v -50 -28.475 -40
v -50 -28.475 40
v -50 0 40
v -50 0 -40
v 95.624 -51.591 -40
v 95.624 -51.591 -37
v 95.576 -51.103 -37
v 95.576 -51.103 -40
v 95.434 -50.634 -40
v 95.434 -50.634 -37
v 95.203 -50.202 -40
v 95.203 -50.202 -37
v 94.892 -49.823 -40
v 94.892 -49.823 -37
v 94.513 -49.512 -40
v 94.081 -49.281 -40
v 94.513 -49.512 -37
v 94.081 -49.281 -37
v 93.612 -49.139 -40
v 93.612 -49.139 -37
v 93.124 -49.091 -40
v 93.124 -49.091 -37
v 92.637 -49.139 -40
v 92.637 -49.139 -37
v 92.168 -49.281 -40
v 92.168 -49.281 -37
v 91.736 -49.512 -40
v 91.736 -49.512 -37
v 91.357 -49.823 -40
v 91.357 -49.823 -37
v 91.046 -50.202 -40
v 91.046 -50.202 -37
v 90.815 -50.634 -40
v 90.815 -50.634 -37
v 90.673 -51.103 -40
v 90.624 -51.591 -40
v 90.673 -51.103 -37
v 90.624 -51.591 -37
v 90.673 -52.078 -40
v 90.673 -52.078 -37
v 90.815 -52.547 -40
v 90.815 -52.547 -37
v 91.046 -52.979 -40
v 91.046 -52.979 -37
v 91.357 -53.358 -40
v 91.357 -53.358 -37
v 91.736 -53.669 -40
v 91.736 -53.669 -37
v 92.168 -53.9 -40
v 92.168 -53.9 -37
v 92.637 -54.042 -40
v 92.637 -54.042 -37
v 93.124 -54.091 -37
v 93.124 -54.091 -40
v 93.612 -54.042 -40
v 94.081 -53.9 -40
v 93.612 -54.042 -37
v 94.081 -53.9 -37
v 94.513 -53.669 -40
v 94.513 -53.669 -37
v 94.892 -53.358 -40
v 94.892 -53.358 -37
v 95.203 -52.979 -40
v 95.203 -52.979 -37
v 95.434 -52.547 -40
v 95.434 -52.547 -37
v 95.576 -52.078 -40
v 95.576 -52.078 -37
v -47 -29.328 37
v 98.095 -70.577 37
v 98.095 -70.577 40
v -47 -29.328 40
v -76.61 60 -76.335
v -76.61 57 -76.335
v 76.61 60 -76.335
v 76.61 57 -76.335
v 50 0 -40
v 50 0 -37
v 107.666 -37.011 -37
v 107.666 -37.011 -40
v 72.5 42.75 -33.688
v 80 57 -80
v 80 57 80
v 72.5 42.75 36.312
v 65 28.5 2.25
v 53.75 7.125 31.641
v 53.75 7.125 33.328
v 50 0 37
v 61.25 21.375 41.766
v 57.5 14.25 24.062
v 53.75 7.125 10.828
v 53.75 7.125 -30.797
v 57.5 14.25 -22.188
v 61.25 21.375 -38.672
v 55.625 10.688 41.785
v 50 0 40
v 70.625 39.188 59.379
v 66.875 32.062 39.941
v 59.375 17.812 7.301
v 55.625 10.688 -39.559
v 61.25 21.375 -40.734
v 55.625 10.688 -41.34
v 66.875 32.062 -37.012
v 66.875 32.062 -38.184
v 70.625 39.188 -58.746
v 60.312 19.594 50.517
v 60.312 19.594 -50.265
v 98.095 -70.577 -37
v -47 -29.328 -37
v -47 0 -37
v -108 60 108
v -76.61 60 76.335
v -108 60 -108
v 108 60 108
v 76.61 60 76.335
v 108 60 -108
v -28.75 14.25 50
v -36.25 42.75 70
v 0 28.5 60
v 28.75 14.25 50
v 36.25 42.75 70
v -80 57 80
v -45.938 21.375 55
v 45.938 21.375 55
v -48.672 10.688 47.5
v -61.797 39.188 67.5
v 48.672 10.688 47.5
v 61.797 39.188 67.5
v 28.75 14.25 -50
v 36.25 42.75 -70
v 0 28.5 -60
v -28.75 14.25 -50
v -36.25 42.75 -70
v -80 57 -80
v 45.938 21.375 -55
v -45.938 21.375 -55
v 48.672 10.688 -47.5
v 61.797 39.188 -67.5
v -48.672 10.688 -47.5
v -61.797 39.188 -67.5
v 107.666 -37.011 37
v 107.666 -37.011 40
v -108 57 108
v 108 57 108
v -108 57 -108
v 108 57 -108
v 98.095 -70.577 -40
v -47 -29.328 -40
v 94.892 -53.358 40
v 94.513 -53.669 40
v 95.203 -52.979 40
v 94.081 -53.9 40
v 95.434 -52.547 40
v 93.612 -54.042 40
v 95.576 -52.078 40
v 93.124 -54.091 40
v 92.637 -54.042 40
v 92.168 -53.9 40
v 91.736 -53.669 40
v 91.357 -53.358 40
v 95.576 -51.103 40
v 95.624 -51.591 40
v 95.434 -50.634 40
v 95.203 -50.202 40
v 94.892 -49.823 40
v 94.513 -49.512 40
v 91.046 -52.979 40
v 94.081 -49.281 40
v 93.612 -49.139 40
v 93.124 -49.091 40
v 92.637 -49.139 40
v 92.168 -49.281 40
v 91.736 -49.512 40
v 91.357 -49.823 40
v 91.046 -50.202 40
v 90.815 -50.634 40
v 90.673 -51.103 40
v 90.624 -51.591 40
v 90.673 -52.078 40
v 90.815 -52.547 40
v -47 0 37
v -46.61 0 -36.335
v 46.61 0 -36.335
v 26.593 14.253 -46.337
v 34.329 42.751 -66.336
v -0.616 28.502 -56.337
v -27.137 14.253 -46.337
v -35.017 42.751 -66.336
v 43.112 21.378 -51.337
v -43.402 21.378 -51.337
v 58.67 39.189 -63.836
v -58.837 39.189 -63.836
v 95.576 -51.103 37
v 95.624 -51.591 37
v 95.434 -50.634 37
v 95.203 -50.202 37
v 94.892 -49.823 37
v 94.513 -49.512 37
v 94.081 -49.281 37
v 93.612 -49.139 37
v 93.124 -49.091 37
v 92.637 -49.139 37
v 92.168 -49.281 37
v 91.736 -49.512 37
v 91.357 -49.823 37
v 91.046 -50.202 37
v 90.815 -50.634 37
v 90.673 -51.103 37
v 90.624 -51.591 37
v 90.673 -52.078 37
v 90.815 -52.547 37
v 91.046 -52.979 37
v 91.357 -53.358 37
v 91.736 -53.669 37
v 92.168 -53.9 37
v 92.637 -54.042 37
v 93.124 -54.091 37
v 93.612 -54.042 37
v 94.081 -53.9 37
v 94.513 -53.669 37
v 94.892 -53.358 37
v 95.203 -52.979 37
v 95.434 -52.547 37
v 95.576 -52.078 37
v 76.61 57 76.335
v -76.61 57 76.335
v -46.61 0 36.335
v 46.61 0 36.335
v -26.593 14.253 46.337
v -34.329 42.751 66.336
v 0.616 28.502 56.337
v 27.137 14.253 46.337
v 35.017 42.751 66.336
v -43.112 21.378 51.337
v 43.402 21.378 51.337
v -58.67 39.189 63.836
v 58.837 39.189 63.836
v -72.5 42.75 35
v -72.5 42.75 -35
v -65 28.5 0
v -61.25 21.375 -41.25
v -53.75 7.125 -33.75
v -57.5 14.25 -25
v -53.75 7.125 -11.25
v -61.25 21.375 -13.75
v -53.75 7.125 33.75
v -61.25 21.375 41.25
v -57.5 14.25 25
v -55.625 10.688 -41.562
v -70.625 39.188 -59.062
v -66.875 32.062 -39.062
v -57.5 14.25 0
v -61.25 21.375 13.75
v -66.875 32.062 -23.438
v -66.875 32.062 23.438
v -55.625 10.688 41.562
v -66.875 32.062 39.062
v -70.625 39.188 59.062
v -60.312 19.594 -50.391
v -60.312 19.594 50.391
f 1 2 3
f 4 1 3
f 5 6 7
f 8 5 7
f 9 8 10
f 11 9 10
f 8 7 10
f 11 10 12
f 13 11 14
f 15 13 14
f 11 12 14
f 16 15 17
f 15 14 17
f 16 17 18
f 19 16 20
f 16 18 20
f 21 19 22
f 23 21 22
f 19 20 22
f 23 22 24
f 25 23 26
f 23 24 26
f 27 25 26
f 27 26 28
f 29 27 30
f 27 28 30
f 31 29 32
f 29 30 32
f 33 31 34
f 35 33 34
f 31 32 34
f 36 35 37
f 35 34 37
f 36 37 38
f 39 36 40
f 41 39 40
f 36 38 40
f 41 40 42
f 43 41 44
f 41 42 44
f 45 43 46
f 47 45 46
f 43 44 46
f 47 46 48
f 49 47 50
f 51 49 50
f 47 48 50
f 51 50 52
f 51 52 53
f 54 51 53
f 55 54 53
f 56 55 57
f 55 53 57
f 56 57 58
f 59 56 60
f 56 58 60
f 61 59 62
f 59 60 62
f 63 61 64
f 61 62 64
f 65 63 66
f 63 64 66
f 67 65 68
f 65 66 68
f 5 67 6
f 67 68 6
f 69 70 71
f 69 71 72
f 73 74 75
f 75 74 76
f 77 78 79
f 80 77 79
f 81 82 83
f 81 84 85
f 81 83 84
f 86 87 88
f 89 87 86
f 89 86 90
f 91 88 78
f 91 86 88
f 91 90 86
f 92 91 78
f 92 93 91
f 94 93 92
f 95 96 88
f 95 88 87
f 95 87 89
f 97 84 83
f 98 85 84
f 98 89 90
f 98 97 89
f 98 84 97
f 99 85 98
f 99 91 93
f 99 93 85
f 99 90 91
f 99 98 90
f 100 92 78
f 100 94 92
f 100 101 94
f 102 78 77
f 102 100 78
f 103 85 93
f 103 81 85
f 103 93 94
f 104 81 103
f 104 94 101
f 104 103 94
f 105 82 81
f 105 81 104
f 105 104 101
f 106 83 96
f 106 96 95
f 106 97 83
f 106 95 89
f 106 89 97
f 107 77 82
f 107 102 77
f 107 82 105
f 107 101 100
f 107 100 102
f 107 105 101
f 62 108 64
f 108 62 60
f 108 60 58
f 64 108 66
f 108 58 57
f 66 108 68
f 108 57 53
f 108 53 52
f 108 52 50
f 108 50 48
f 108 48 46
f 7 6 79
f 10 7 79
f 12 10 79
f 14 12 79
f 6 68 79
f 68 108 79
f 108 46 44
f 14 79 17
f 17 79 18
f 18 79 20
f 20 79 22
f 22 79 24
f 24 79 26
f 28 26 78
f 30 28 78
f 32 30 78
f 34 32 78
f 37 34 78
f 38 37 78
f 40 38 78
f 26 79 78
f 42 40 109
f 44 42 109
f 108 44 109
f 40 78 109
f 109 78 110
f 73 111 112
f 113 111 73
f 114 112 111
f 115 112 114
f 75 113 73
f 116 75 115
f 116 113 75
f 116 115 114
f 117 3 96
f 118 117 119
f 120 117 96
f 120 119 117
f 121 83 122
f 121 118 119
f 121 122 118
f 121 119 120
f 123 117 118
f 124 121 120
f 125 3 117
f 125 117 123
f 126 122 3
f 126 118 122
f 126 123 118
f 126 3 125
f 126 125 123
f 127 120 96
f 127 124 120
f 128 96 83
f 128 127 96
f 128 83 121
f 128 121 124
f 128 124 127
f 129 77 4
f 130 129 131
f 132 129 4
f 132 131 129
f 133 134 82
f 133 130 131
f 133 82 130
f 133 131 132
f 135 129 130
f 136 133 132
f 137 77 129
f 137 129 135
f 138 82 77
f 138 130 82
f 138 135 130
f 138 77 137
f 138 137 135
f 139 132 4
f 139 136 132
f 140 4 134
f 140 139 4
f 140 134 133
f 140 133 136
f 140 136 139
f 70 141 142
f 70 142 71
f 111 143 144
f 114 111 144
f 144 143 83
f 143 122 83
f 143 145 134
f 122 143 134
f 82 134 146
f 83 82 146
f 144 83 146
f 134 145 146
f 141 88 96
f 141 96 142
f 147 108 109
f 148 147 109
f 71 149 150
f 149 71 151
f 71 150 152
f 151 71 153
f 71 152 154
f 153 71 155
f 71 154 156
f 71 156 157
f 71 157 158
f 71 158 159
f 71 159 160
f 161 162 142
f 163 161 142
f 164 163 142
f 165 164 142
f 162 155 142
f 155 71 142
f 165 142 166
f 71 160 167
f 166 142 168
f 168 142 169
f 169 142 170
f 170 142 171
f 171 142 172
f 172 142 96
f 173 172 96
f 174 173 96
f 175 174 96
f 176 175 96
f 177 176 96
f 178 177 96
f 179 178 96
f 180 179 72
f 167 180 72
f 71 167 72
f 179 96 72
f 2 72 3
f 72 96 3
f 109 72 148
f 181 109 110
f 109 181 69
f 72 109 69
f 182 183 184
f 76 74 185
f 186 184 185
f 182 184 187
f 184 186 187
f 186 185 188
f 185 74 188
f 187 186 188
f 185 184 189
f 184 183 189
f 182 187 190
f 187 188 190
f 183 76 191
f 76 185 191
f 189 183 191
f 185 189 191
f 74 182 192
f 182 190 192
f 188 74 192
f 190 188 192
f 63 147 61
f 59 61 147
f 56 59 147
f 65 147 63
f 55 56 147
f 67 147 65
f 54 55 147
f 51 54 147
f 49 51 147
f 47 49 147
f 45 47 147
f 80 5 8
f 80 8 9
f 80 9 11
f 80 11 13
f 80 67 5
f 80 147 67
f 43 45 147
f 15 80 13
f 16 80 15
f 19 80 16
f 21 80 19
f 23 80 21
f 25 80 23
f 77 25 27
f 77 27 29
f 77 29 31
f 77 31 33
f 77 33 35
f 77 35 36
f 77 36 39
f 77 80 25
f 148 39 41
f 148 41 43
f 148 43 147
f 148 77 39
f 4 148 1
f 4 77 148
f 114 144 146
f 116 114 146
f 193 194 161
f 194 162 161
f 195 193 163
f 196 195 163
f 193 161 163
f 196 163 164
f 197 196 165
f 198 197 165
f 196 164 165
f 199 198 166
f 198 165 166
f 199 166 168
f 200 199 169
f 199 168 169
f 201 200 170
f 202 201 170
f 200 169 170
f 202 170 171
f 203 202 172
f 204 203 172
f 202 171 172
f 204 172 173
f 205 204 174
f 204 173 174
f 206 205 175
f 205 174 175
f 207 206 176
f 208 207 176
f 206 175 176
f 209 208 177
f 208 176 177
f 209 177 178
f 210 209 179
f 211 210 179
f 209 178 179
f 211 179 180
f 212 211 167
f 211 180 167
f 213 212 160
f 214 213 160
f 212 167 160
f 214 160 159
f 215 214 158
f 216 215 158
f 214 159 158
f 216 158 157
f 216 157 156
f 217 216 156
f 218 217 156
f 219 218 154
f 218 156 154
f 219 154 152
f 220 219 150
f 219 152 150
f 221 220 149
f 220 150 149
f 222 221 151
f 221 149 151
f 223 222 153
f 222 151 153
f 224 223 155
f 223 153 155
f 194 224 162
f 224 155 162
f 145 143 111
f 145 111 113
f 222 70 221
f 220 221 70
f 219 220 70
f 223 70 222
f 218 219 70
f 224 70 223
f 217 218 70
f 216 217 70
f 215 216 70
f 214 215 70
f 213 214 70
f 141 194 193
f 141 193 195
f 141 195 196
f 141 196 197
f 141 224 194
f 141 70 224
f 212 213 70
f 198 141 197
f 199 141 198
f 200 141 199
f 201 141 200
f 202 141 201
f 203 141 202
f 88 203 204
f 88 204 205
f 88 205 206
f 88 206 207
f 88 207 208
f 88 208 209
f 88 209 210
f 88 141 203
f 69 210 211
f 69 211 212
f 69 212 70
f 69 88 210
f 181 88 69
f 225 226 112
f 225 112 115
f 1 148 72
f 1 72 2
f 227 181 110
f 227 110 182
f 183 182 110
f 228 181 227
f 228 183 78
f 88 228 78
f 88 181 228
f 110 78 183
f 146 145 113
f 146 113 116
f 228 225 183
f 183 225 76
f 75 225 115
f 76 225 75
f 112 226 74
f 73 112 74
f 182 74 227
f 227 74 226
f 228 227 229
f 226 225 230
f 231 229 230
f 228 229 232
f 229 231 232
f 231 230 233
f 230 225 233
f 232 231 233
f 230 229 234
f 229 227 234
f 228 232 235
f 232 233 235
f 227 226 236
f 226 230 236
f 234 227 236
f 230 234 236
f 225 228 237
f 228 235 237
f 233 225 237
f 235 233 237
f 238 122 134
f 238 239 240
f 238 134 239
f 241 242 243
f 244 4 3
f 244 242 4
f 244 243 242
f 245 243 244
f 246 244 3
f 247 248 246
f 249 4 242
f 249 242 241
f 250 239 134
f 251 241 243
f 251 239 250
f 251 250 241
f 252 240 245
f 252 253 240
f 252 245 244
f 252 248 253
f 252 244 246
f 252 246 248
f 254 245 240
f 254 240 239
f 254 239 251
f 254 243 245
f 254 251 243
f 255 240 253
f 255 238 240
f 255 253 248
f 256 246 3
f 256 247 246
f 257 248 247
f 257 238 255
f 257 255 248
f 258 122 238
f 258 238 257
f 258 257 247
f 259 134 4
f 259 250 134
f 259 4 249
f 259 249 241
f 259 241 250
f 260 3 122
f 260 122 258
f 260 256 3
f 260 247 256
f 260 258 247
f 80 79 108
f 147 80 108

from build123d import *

# Parameters (mm, degrees)
WALL_THICKNESS_T         = -3
FLANGE_PROFILE_W         = 216
FLANGE_PROFILE_H         = 216
FLANGE_PROFILE_W_2       = 153.219712456
FLANGE_PROFILE_H_2       = 152.670025112
MOUNTING_FLANGE_DEPTH    = 3
OUTLET_START             = 37
OUTLET_SIDE_FRONT_DEPTH  = 3
OUTLET_START_2           = -37
OUTLET_SIDE_REAR_DEPTH   = 3
OUTLET_BACK_DEPTH        = 40
SKETCH_6_R               = 2.5
JOINT_FIXING_HOLES_DEPTH = 40


with BuildPart() as part:
    # 草图1 → Hopper Shape section 0
    with BuildSketch(Plane(origin=(0, 0, 0), x_dir=(1, 0, 0), z_dir=(0, 1, 0))):
        with BuildLine():
            Line((-50, -40), (50, -40))
            Line((50, -40), (50, 40))
            Line((50, 40), (-50, 40))
            Line((-50, 40), (-50, -40))
        make_face()
    # Inlet Profile → Hopper Shape section 1
    with BuildSketch(Plane(origin=(0, 57, 0), x_dir=(1, 0, 0), z_dir=(0, 1, 0))):
        with BuildLine():
            Line((-80, -80), (80, -80))
            Line((80, -80), (80, 80))
            Line((80, 80), (-80, 80))
            Line((-80, 80), (-80, -80))
        make_face()
    loft()

    # Wall Thickness
    wall_thickness_openings = [part.faces().sort_by_distance(p)[0] for p in [
        (0, 57, 0),
        (0, 0, 0),
    ]]
    offset(amount=WALL_THICKNESS_T, openings=wall_thickness_openings, kind=Kind.INTERSECTION)

    # Flange Profile → Mounting Flange (add)
    with BuildSketch(Plane(origin=(0, 57, 0), x_dir=(1, 0, 0), z_dir=(0, 1, 0))):
        Rectangle(FLANGE_PROFILE_W, FLANGE_PROFILE_H)
        Rectangle(FLANGE_PROFILE_W_2, FLANGE_PROFILE_H_2, mode=Mode.SUBTRACT)
    extrude(amount=MOUNTING_FLANGE_DEPTH)

    # 草图3 → Outlet Side Front (add)
    with BuildSketch(Plane.XY.offset(OUTLET_START)):
        Polygon((-50, 0), (50, 0), (107.665544, -37.011165), (98.094598, -70.577127), (-50, -28.475092372), align=None)
    extrude(amount=OUTLET_SIDE_FRONT_DEPTH)

    # 草图4 → Outlet Side Rear (add)
    with BuildSketch(Plane.XY.offset(OUTLET_START_2)):
        Polygon((-50, 0), (50, 0), (107.665544, -37.011165), (98.094598, -70.577127), (-50, -28.475092372), align=None)
    extrude(amount=-OUTLET_SIDE_REAR_DEPTH)

    # 草图5 → Outlet Back (add, symmetric)
    with BuildSketch(Plane.XY):
        Polygon((-50, 0), (-47, 0), (-47, -29.327967372), (-50, -28.475092372), align=None)
    extrude(amount=OUTLET_BACK_DEPTH, both=True)

    # 草图6 → Joint Fixing Holes (cut, symmetric)
    with BuildSketch(Plane.XY):
        with Locations((93.124497189, -51.590532135)):
            Circle(SKETCH_6_R)
    extrude(amount=JOINT_FIXING_HOLES_DEPTH, both=True, mode=Mode.SUBTRACT)


solid = part.part
